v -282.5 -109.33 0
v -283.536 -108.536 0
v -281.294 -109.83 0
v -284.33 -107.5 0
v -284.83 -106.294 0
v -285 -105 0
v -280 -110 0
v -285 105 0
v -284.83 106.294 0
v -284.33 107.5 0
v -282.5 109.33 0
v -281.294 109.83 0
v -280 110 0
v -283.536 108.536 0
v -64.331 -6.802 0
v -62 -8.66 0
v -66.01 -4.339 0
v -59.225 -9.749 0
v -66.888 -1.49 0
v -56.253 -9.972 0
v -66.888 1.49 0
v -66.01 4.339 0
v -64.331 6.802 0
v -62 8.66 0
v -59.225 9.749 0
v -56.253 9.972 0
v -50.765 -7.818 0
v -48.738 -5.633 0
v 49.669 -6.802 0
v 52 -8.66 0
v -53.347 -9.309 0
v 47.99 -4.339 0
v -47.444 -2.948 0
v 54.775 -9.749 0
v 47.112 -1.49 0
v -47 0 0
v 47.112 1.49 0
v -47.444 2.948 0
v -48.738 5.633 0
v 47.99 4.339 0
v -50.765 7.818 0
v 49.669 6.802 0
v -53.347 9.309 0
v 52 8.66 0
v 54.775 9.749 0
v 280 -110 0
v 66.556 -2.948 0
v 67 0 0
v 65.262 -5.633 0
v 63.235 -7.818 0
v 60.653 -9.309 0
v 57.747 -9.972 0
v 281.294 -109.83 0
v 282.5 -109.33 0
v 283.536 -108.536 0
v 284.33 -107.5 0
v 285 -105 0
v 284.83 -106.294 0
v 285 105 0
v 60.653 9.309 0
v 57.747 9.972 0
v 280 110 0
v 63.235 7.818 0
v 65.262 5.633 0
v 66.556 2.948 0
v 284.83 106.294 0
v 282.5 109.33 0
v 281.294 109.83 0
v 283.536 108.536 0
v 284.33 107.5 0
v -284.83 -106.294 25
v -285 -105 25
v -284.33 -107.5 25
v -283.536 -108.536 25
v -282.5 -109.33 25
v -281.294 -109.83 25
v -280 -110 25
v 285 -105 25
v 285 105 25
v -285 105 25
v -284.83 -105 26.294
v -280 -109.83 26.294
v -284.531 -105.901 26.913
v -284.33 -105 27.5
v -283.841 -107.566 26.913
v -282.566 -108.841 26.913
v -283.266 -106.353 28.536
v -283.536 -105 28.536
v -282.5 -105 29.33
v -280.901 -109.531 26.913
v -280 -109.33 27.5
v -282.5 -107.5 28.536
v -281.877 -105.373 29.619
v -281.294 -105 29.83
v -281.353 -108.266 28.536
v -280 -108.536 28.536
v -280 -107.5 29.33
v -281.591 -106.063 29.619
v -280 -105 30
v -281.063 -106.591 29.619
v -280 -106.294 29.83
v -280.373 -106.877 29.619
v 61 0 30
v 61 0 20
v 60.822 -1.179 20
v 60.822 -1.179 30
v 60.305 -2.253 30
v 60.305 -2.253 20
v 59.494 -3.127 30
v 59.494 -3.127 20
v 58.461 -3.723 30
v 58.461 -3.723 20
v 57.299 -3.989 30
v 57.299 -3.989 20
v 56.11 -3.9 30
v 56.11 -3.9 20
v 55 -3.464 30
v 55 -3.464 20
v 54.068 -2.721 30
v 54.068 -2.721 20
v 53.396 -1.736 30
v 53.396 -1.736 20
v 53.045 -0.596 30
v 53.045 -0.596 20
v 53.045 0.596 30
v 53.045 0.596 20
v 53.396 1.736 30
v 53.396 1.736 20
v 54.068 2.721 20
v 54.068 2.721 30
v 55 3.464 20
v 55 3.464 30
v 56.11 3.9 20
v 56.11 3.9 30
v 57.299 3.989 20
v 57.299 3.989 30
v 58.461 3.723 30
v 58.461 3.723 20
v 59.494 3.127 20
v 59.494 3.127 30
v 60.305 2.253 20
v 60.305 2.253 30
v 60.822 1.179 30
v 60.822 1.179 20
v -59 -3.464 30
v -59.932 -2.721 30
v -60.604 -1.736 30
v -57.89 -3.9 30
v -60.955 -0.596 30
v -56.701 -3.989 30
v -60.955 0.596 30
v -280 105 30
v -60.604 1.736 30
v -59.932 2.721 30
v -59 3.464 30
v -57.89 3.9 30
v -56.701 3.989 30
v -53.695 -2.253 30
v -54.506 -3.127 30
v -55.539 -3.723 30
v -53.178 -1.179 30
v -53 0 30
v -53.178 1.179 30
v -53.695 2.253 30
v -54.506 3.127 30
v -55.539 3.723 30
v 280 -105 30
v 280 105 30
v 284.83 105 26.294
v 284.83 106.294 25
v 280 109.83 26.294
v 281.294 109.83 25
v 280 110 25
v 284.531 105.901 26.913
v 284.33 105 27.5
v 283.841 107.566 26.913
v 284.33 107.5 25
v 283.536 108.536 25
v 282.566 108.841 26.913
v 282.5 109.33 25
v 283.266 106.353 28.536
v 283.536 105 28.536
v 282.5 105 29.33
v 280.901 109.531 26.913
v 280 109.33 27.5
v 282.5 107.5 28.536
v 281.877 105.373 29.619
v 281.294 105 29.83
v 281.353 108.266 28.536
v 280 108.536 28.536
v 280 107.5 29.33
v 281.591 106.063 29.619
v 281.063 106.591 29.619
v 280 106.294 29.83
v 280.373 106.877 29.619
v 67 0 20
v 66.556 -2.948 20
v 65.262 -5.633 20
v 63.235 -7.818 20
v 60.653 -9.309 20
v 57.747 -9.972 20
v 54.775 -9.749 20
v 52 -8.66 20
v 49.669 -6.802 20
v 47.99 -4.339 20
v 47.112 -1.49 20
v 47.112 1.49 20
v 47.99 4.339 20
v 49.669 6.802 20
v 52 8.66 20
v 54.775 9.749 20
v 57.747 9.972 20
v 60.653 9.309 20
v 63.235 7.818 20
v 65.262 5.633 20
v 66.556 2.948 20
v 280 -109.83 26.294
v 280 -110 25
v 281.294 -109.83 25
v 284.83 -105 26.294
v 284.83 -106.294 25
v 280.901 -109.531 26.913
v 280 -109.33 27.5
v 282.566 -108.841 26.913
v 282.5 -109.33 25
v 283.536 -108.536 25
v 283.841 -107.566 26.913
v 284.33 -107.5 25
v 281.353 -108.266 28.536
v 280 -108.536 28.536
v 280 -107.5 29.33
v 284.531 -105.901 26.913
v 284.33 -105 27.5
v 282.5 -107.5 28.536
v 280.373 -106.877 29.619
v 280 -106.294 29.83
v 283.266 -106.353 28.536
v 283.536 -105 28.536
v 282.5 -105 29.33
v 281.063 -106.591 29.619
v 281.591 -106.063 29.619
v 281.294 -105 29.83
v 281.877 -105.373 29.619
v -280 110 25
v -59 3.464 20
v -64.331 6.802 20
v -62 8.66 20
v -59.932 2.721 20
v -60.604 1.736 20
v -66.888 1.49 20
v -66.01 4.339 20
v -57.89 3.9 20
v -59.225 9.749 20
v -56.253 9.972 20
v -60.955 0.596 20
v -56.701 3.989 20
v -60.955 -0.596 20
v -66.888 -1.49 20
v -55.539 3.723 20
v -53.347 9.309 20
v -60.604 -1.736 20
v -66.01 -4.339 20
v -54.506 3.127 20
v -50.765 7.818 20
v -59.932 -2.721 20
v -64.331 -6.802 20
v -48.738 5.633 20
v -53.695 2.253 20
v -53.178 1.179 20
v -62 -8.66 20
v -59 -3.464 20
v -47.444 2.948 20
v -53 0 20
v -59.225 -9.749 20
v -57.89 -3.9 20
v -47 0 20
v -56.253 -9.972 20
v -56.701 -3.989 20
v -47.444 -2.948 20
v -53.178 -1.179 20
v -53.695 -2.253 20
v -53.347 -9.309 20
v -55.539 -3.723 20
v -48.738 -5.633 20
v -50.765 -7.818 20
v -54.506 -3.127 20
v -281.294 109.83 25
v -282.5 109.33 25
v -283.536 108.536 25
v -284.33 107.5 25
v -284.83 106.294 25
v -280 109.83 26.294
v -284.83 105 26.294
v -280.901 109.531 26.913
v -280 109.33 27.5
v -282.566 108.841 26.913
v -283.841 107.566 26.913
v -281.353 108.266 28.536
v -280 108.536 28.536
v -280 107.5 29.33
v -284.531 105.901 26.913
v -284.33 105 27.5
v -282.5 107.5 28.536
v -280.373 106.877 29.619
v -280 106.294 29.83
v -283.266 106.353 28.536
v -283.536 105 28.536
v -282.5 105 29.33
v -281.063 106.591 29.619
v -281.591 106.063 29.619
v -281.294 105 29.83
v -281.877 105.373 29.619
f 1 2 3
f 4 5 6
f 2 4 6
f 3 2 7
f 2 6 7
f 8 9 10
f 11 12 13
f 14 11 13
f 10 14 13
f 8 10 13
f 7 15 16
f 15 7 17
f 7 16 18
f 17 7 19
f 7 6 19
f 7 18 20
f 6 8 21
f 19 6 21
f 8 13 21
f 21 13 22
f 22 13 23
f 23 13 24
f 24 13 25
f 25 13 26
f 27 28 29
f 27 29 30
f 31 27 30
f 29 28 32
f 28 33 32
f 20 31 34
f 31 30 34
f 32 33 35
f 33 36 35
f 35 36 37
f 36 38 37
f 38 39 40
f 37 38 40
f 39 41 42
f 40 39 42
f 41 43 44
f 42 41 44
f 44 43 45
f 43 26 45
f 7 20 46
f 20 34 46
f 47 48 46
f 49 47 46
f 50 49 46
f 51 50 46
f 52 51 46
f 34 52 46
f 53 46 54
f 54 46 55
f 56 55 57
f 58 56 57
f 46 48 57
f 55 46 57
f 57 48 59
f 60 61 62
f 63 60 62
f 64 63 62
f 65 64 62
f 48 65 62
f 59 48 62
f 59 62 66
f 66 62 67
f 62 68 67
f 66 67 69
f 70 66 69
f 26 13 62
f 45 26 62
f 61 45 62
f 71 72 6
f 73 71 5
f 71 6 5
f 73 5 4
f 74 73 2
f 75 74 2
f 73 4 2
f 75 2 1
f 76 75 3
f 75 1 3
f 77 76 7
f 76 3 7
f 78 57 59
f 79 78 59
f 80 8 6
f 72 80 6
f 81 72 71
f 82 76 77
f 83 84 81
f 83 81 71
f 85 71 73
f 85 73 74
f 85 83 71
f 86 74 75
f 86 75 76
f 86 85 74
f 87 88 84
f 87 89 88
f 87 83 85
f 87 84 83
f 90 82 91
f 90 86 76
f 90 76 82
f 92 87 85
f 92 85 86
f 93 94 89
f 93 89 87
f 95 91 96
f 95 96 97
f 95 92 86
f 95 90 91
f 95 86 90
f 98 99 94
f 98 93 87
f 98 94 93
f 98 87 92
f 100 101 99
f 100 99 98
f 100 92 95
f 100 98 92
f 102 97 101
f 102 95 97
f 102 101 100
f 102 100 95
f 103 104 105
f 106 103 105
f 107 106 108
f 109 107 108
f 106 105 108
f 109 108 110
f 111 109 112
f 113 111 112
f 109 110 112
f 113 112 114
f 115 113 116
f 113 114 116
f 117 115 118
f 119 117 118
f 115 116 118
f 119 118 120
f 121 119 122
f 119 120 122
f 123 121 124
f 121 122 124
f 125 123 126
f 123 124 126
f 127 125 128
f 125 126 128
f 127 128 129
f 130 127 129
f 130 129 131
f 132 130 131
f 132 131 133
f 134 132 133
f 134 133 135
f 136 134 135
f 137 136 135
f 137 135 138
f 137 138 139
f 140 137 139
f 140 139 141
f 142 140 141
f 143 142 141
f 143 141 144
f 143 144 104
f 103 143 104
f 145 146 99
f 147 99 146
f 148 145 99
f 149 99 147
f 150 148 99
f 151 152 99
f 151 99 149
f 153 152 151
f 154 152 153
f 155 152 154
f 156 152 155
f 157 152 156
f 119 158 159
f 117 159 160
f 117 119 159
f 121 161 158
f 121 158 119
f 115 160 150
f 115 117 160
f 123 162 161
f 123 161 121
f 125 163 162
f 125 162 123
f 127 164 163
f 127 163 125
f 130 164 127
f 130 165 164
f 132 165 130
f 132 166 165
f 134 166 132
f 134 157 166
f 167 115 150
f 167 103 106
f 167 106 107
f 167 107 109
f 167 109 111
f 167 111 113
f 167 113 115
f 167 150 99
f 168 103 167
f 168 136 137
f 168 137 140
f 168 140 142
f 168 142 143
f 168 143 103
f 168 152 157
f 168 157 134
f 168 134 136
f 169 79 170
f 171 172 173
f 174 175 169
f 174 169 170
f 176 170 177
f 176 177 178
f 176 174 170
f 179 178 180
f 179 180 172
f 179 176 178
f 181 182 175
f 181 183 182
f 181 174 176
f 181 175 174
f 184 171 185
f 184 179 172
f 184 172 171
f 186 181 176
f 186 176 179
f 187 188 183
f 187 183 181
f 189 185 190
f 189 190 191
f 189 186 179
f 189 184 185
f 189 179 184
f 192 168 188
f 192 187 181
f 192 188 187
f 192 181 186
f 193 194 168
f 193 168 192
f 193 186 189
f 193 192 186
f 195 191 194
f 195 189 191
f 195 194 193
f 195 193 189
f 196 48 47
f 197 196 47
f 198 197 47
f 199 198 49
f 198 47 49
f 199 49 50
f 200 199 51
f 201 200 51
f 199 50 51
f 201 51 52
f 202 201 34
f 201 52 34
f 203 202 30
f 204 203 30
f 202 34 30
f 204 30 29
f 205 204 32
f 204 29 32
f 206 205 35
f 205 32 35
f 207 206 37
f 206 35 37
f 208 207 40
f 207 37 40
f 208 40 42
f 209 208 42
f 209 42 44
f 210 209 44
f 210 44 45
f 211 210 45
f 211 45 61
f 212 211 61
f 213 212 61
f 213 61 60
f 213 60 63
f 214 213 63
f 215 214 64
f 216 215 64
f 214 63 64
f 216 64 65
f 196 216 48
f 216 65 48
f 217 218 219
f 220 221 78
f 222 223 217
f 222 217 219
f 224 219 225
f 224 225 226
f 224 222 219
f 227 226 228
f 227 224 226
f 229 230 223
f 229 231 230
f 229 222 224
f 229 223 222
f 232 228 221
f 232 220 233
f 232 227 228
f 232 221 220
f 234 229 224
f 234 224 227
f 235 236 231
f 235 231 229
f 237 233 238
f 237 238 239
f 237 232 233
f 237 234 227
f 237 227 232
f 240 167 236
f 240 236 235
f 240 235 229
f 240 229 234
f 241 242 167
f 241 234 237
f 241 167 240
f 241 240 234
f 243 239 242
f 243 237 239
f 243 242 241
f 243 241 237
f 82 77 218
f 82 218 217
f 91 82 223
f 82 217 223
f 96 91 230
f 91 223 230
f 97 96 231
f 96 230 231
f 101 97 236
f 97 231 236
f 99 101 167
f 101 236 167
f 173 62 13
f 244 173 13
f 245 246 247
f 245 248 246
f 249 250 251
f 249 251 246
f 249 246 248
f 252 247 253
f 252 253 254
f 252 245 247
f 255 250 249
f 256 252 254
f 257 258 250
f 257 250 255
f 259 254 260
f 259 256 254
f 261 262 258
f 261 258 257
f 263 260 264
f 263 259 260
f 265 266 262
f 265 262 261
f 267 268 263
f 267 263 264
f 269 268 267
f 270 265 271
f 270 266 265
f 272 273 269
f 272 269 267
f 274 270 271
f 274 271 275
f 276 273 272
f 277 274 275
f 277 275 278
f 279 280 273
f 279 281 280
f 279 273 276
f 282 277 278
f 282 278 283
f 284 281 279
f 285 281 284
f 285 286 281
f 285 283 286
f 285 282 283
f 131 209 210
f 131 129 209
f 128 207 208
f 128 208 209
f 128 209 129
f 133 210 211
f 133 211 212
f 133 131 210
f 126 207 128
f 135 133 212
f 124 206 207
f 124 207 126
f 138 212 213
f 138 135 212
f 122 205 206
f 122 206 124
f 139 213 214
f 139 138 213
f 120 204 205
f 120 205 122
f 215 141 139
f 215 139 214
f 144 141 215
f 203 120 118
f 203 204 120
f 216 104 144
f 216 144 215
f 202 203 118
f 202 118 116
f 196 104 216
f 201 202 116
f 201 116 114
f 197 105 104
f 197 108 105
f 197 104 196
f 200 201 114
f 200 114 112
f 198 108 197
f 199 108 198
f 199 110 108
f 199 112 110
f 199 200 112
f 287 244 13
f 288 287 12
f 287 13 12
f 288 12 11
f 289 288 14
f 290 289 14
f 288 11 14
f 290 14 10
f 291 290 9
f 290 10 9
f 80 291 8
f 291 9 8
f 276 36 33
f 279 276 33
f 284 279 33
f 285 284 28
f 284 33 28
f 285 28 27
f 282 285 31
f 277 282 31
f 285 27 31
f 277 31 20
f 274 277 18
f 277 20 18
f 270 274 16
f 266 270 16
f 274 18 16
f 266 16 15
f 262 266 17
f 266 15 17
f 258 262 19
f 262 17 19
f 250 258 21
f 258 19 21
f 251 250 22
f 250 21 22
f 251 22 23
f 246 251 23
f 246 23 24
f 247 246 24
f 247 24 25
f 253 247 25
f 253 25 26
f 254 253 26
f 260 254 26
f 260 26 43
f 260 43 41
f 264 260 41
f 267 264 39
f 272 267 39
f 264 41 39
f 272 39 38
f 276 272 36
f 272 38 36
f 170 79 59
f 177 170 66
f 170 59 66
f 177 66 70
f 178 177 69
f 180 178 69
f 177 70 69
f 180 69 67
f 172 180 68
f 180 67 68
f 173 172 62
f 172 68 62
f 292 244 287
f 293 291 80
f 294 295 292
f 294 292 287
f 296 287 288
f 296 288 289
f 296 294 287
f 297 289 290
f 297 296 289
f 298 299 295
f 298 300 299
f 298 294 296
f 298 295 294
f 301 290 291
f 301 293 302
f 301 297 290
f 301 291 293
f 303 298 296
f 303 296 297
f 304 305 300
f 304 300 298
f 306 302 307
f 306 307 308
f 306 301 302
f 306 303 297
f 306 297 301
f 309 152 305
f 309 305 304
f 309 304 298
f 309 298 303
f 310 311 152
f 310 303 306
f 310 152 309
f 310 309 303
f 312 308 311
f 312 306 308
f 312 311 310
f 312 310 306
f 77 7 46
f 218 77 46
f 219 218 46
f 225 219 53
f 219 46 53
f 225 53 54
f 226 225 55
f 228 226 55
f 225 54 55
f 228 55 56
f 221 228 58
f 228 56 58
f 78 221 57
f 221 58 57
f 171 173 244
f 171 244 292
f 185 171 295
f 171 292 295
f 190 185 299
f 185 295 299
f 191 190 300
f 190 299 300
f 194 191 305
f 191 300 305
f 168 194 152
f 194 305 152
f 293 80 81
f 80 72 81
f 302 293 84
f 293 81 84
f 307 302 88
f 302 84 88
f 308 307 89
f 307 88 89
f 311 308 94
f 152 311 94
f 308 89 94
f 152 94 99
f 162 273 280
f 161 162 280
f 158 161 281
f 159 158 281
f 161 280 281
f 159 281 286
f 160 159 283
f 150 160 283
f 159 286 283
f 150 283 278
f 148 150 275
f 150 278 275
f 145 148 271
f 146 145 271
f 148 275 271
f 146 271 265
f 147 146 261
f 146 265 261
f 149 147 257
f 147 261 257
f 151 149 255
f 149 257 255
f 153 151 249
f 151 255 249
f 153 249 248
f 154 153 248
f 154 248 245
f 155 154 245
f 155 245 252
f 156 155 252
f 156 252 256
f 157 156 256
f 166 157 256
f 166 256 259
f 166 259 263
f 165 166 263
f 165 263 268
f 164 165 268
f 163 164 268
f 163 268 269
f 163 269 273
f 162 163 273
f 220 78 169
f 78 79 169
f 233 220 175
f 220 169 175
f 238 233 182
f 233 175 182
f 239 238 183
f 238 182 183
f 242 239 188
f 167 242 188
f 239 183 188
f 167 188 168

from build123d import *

# Parameters (mm, degrees)
F1_DEPTH = 30
F2_R     = 5
F3_R     = 10
F3_R_2   = 4
F4_DEPTH = 20
F5_DEPTH = 30.001


with BuildPart() as f1:
    # F0 (on Top) → F1 (new body)
    with BuildSketch(Plane.XY):
        with BuildLine():
            Line((-285, 105), (-285, 0))
            Line((-285, 0), (-285, -105))
            ThreePointArc((-285, -105), (-283.5355339059, -108.5355339059), (-280, -110))
            Line((-280, -110), (0, -110))
            Line((0, -110), (280, -110))
            ThreePointArc((280, -110), (283.5355339059, -108.5355339059), (285, -105))
            Line((285, -105), (285, 0))
            Line((285, 0), (285, 105))
            ThreePointArc((285, 105), (283.5355339059, 108.5355339059), (280, 110))
            Line((280, 110), (0, 110))
            Line((0, 110), (-280, 110))
            ThreePointArc((-280, 110), (-283.5355339059, 108.5355339059), (-285, 105))
        make_face()
    extrude(amount=F1_DEPTH)

    # F2
    f2_edges = [f1.edges().sort_by_distance(p)[0] for p in [
        (-285, 0, 30),
        (-283.535534, -108.535534, 30),
        (0, -110, 30),
        (283.535534, -108.535534, 30),
        (285, 0, 30),
        (283.535534, 108.535534, 30),
        (0, 110, 30),
        (-283.535534, 108.535534, 30),
    ]]
    fillet(f2_edges, radius=F2_R)

    # F3 (on face) → F4 (cut)
    with BuildSketch(Plane(origin=(0, 0, 0), x_dir=(1, 0, 0), z_dir=(0, 0, -1))):
        with Locations((57, 0)):
            Circle(F3_R)
        with Locations((57, 0)):
            Circle(F3_R_2, mode=Mode.SUBTRACT)
        with Locations((-57, 0)):
            Circle(F3_R)
        with Locations((-57, 0)):
            Circle(F3_R_2, mode=Mode.SUBTRACT)
    extrude(amount=-F4_DEPTH, mode=Mode.SUBTRACT)

    # F5 (cut, through all): faces of the model
    f5_faces = [f1.faces().sort_by_distance(p)[0] for p in [
        (57, 0, 0),
        (-57, 0, 0),
    ]]
    extrude(f5_faces, amount=-F5_DEPTH, mode=Mode.SUBTRACT)


solid = f1.part
